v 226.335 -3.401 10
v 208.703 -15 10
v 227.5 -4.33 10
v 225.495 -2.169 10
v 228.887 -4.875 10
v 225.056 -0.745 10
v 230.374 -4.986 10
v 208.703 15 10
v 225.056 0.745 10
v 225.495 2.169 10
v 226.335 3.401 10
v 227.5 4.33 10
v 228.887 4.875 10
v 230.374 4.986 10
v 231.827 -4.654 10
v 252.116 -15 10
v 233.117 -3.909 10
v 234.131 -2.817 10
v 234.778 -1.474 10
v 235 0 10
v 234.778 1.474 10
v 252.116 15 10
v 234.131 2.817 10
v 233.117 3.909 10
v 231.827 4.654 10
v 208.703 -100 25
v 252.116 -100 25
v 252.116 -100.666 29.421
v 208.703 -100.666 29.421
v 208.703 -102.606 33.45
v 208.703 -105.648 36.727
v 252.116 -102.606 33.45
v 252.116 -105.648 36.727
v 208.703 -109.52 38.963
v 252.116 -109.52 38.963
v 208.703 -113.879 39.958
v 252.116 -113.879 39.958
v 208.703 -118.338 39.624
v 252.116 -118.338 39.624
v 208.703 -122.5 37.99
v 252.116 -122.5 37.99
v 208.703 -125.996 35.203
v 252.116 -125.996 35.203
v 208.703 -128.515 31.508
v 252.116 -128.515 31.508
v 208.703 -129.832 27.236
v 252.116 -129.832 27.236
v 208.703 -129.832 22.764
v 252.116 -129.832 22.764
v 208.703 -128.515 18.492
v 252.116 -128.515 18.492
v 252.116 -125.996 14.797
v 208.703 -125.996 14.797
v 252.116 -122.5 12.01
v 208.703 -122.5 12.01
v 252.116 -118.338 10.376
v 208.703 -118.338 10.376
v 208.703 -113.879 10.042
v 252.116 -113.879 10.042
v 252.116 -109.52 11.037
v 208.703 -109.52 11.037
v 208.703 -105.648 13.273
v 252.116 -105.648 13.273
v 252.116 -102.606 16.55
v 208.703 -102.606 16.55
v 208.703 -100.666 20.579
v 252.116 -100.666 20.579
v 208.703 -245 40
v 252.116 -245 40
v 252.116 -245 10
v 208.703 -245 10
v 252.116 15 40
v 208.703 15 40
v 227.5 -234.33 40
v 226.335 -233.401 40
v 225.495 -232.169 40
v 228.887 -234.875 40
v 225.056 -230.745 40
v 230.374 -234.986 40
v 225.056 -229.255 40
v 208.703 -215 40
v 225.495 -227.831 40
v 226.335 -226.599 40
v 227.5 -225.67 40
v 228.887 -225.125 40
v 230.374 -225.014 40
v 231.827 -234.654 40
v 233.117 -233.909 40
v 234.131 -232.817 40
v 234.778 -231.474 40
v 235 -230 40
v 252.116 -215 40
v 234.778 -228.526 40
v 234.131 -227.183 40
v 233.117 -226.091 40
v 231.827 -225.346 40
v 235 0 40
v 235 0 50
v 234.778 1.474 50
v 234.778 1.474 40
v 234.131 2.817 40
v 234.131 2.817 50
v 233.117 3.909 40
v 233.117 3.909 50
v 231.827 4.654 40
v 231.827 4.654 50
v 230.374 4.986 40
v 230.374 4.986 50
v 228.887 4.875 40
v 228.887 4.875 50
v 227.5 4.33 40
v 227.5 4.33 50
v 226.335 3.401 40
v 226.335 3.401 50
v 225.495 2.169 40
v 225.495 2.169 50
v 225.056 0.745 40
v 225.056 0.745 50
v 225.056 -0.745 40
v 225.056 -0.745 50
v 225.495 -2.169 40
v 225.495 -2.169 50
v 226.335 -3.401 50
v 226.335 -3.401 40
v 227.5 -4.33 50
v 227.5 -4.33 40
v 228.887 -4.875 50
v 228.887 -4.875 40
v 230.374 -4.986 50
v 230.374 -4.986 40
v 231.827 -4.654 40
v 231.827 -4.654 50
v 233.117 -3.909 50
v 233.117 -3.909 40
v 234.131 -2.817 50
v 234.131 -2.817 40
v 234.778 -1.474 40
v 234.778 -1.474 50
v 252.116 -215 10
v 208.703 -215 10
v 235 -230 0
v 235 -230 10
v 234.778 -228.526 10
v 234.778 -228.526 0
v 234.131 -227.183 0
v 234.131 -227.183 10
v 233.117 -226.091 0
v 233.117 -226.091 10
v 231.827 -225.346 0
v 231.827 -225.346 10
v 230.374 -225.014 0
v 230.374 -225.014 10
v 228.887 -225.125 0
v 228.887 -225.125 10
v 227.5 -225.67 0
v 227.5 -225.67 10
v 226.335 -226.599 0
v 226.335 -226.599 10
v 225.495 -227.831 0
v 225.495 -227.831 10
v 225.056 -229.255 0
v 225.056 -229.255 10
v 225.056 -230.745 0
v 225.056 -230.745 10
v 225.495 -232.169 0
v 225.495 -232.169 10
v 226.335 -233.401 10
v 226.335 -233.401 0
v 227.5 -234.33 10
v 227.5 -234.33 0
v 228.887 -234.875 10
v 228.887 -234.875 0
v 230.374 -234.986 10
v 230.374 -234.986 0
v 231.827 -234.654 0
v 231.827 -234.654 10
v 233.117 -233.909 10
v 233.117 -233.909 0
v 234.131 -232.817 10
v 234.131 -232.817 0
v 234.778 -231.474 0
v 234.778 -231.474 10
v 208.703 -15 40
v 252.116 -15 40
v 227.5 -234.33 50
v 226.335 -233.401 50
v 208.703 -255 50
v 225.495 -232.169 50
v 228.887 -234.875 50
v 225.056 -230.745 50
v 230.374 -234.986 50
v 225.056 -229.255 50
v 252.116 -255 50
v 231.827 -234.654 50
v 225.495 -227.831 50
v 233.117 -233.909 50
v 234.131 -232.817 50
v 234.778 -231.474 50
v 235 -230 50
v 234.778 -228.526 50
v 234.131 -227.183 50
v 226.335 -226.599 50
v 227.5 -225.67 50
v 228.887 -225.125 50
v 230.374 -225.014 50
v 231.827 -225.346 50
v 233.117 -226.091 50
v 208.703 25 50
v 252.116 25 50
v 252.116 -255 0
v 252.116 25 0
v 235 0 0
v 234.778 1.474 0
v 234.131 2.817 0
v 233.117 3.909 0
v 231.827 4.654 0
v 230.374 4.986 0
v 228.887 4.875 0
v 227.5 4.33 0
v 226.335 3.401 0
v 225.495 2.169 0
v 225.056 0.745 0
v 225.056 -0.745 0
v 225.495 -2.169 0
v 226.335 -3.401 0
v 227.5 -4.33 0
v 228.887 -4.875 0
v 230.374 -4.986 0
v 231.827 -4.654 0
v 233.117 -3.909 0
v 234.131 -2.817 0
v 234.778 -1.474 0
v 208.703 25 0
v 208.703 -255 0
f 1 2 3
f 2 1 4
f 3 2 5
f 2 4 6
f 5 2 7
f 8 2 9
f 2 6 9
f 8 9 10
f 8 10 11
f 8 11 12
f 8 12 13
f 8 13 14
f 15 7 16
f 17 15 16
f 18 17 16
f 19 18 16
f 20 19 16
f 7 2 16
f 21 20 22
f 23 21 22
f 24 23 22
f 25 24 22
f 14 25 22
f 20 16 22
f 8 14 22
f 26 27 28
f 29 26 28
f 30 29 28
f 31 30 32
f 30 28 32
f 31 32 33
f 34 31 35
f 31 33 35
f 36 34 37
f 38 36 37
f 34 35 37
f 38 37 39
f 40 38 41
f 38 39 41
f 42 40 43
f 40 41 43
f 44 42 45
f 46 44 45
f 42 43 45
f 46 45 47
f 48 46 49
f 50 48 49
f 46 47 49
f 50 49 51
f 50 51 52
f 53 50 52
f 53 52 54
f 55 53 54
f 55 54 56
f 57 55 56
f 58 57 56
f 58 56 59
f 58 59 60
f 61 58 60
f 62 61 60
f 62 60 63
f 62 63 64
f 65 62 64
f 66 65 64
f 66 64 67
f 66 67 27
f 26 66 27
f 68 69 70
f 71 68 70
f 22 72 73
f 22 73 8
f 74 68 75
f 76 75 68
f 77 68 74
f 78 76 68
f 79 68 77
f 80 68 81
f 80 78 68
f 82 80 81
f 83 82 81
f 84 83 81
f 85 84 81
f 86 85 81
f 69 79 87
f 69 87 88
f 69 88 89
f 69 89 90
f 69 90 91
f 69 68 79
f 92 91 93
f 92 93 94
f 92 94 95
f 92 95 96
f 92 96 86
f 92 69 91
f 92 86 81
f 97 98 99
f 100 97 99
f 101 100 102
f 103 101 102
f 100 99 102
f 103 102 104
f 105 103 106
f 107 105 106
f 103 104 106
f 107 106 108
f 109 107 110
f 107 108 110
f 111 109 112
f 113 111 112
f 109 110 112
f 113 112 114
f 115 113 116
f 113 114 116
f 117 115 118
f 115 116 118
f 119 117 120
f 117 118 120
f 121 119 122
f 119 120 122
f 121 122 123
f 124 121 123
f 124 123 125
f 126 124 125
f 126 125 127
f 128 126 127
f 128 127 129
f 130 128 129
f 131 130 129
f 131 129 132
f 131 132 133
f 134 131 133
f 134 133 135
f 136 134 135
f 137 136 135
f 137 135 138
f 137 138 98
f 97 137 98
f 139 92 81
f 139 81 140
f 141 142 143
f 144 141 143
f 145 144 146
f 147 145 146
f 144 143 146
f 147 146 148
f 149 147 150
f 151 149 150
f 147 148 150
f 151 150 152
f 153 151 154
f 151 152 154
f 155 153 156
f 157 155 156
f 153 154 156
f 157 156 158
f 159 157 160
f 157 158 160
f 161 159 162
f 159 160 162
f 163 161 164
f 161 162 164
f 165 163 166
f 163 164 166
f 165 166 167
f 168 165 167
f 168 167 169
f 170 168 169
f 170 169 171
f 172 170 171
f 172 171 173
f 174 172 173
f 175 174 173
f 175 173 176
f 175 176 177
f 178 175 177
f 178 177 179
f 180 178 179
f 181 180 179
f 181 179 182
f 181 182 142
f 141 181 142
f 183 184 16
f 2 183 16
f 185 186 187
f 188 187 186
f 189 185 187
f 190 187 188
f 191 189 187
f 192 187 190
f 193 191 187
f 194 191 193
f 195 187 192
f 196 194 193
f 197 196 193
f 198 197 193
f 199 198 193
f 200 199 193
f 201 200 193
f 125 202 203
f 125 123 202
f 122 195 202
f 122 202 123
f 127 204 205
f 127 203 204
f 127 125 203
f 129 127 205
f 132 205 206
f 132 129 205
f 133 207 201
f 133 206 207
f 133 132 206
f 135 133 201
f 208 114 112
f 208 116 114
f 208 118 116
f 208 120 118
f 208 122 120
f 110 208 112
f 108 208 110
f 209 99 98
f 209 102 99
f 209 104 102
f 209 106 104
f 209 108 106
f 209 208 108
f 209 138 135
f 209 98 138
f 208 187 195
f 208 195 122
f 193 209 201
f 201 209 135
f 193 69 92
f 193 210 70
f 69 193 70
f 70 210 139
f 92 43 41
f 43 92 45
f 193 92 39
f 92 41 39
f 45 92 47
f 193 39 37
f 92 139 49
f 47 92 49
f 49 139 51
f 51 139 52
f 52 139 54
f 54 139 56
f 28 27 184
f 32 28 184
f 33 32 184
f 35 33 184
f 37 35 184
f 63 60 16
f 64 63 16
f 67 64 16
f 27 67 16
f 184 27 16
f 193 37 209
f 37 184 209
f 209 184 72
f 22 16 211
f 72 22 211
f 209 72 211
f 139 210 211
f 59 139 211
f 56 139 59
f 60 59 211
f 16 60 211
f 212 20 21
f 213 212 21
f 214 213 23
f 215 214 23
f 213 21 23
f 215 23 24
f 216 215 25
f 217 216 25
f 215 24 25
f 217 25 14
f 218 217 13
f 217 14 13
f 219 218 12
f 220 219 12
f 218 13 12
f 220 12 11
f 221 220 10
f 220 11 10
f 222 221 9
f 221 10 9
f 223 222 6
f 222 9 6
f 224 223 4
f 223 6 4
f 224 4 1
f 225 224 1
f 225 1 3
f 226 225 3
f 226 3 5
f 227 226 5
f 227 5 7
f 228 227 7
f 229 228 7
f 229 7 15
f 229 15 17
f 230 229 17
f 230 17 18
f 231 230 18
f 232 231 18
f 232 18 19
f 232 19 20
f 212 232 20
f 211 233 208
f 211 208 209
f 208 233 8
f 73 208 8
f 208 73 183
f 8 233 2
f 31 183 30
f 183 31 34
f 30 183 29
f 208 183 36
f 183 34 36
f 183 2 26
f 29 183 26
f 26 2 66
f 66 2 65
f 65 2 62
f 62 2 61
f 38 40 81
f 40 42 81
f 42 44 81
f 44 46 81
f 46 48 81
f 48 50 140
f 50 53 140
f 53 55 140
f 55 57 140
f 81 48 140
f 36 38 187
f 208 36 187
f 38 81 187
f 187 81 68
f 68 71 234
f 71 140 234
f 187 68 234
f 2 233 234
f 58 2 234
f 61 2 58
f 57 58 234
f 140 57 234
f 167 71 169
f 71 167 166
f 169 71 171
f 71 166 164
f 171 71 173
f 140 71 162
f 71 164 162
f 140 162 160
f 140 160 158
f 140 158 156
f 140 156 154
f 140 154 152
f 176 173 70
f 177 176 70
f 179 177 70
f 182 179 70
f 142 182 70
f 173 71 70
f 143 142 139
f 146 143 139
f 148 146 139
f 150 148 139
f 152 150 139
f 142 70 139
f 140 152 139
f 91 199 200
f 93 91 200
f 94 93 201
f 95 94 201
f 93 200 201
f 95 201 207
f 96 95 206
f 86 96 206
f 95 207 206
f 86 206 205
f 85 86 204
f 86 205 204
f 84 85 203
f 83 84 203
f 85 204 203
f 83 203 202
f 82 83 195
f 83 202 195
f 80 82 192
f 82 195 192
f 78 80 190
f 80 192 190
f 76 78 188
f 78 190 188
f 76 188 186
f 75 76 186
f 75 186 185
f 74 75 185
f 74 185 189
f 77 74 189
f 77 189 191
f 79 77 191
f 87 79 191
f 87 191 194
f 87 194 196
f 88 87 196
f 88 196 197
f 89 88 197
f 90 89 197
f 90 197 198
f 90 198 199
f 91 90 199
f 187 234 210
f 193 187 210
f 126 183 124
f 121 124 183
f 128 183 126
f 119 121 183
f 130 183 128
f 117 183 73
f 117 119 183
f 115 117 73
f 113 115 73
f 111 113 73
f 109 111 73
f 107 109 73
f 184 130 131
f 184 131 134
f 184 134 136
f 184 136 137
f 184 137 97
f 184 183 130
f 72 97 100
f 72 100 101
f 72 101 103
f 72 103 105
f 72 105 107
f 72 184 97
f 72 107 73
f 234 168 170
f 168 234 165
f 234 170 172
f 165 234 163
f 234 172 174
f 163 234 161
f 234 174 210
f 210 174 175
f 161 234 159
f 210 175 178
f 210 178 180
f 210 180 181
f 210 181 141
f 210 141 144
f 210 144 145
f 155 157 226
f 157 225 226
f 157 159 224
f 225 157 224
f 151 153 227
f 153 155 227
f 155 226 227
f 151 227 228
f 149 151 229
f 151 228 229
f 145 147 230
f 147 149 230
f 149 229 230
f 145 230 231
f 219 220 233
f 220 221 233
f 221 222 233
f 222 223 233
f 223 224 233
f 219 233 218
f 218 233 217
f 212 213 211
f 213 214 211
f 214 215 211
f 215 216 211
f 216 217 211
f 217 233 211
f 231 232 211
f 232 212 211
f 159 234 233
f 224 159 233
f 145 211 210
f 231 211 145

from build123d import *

# Parameters (mm, degrees)
SKETCH1_W           = 43.412860342
SKETCH1_H           = 140
BOSS_EXTRUDE1_DEPTH = 50
SKETCH2_R           = 5
CUT_EXTRUDE1_DEPTH  = 50
SKETCH3_W           = 30
SKETCH3_H           = 30
CUT_EXTRUDE2_DEPTH  = 50
SKETCH5_R           = 15
CUT_EXTRUDE3_DEPTH  = 50


with BuildPart() as part:
    # Sketch1 → Boss-Extrude1 (new body)
    with BuildSketch(Plane.XY):
        with Locations((230.409564966, -45)):
            Rectangle(SKETCH1_W, SKETCH1_H)
        with Locations((230.409564966, -185)):
            Rectangle(SKETCH1_W, SKETCH1_H)
    extrude(amount=BOSS_EXTRUDE1_DEPTH)

    # Sketch2 → Cut-Extrude1 (cut)
    with BuildSketch(Plane.XY.offset(50)):
        with Locations((230, 0)):
            Circle(SKETCH2_R)
        with Locations((230, -230)):
            Circle(SKETCH2_R)
    extrude(amount=-CUT_EXTRUDE1_DEPTH, mode=Mode.SUBTRACT)

    # Sketch3 → Cut-Extrude2 (cut)
    with BuildSketch(Plane(origin=(252.115995137, 0, 0), x_dir=(0, 0, -1), z_dir=(1, 0, 0))):
        with Locations((-25, 0)):
            Rectangle(SKETCH3_W, SKETCH3_H)
        with Locations((-25, -230)):
            Rectangle(SKETCH3_W, SKETCH3_H)
    extrude(amount=-CUT_EXTRUDE2_DEPTH, mode=Mode.SUBTRACT)

    # Sketch5 → Cut-Extrude3 (cut)
    with BuildSketch(Plane(origin=(252.115995137, 0, 0), x_dir=(0, 0, -1), z_dir=(1, 0, 0))):
        with Locations(Location((-25, -115, 0), (0, 0, 90))):
            Circle(SKETCH5_R)
    extrude(amount=-CUT_EXTRUDE3_DEPTH, mode=Mode.SUBTRACT)


solid = part.part
